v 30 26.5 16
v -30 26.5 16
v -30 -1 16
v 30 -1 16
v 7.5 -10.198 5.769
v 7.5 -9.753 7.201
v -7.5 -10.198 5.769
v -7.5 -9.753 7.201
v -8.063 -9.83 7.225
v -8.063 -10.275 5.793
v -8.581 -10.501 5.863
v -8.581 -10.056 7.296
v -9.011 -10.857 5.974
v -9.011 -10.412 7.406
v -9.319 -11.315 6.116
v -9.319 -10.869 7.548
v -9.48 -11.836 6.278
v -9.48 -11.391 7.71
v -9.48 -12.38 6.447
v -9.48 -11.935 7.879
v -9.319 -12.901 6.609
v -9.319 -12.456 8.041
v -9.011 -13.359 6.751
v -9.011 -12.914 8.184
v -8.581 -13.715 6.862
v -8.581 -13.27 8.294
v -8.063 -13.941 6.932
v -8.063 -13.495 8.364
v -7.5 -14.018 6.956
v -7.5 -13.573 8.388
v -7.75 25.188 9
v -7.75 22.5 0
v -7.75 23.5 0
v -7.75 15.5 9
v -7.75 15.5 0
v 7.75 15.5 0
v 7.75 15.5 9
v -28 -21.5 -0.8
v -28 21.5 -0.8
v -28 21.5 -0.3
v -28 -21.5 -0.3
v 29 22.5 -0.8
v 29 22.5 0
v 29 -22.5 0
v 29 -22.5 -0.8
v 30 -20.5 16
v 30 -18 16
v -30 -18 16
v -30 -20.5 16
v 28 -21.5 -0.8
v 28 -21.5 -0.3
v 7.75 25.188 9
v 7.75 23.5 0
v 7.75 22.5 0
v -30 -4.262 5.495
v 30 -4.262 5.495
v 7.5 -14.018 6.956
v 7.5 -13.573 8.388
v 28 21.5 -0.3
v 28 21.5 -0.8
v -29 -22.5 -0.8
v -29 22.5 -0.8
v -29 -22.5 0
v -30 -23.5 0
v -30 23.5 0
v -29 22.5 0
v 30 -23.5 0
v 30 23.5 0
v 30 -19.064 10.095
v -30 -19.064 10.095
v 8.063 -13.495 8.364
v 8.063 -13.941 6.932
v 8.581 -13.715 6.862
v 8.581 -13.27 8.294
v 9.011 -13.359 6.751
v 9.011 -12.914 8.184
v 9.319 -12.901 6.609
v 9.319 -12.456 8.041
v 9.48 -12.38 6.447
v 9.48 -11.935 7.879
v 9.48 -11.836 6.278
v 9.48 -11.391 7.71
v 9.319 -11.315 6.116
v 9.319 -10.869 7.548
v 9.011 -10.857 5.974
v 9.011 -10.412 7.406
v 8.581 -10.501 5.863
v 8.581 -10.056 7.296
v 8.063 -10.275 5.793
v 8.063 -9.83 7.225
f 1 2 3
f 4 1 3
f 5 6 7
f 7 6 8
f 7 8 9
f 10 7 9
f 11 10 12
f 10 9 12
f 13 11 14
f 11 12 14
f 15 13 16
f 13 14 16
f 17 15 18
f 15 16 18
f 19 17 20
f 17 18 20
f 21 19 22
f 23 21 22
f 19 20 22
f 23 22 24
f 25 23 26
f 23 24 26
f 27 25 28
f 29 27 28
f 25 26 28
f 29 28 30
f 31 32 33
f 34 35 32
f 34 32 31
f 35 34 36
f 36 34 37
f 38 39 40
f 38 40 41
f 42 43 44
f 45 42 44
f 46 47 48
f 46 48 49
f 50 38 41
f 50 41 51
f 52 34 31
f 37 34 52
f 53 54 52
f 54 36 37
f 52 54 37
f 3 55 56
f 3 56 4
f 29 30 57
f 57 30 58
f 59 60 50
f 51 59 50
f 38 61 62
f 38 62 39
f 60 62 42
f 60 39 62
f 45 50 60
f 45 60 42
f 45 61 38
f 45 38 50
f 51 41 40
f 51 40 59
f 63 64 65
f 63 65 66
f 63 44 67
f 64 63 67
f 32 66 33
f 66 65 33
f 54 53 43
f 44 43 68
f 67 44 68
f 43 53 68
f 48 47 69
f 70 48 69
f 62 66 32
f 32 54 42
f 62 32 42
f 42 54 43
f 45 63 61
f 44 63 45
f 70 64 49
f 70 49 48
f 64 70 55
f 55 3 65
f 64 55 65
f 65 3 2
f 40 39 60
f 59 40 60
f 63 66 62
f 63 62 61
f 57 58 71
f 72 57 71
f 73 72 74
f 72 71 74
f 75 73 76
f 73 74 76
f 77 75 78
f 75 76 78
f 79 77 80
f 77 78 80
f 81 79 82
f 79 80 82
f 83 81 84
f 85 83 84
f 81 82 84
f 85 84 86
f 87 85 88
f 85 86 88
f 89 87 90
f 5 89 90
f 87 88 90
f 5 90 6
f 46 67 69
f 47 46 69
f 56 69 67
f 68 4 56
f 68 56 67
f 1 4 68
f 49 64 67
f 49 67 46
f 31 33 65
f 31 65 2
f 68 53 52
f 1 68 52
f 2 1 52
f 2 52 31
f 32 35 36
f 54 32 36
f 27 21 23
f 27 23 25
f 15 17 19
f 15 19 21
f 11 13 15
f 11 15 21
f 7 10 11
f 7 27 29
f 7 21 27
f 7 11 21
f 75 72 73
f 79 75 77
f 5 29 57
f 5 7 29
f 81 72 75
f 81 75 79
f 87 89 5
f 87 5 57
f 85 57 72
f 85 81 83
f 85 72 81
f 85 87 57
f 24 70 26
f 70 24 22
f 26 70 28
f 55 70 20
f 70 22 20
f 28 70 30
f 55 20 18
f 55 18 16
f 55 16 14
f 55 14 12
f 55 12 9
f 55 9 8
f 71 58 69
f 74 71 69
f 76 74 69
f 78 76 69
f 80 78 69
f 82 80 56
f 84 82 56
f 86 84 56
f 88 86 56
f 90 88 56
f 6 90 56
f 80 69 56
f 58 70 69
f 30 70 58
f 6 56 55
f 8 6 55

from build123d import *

# Parameters (mm, degrees)
F0_W      = 60
F0_H      = 47
F1_DEPTH  = 16
F2_W      = 58
F2_H      = 45
F3_DEPTH  = 0.8
F4_W      = 56
F4_H      = 43
F5_DEPTH  = 0.5
F7_DEPTH  = 60
F9_DEPTH  = 60.001
F11_DEPTH = 60.001
F14_W     = 15.5
F14_H     = 9
F15_DEPTH = 25
F9_FACE_W = 60
F9_FACE_H = 16.2788205961
F17_DEPTH = 1.5


with BuildPart() as f1:
    # F0 (on Top) → F1 (new body)
    with BuildSketch(Plane.XY):
        Rectangle(F0_W, F0_H)
    extrude(amount=F1_DEPTH)

    # F2 (on face) → F3 (join)
    with BuildSketch(Plane(origin=(0, 0, 0), x_dir=(1, 0, 0), z_dir=(0, 0, -1))):
        Rectangle(F2_W, F2_H)
    extrude(amount=F3_DEPTH)

    # F4 (on face) → F5 (cut)
    with BuildSketch(Plane(origin=(0, 0, -0.8), x_dir=(1, 0, 0), z_dir=(0, 0, -1))):
        Rectangle(F4_W, F4_H)
    extrude(amount=-F5_DEPTH, mode=Mode.SUBTRACT)

    # F6 (on face) → F7 (join)
    with BuildSketch(Plane.YZ.offset(30)):
        Polygon((26.5, 16), (23.5, 16), (23.5, 0), align=None)
    extrude(amount=-F7_DEPTH)

    # F8 (on face) → F9 (cut, through all)
    with BuildSketch(Plane.YZ.offset(30)):
        Polygon((-20.5, 16), (-23.5, 16), (-23.5, 0), align=None)
    extrude(amount=-F9_DEPTH, mode=Mode.SUBTRACT)

    # F10 (on face) → F11 (cut, through all)
    with BuildSketch(Plane.YZ.offset(30)):
        Polygon((-4.261999952, 5.4947938472), (-1, 16), (-18, 16), (-19.0636169243, 10.0950259071), align=None)
    extrude(amount=-F11_DEPTH, mode=Mode.SUBTRACT)

    # F14 (on plane+point) → F15 (cut)
    with BuildSketch(Plane.XZ.offset(-15.5)):
        with Locations((0, 4.5)):
            Rectangle(F14_W, F14_H)
    extrude(amount=-F15_DEPTH, mode=Mode.SUBTRACT)

    # F16 (on face) + F9_face (on face) → F17 (cut)
    with BuildSketch(Plane(origin=(0, 1.1819033976, 3.8028693253), x_dir=(1, 0, 0), z_dir=(0, 0.2967891652, 0.9549430305))):
        with BuildLine():
            ThreePointArc((7.5, -15.4507624286), (9.5, -13.4507624286), (7.5, -11.4507624286))
            Line((7.5, -11.4507624286), (-7.5, -11.4507624286))
            ThreePointArc((-7.5, -11.4507624286), (-9.5, -13.4507624286), (-7.5, -15.4507624286))
            Line((-7.5, -15.4507624286), (7.5, -15.4507624286))
        make_face()
    with BuildSketch(Plane(origin=(0, -22, 8), x_dir=(1, 0, 0), z_dir=(0, -0.9828721869, 0.1842885351))):
        Rectangle(F9_FACE_W, F9_FACE_H)
    extrude(amount=-F17_DEPTH, dir=(0, 0.2967891652, 0.9549430305), mode=Mode.SUBTRACT)


solid = f1.part
